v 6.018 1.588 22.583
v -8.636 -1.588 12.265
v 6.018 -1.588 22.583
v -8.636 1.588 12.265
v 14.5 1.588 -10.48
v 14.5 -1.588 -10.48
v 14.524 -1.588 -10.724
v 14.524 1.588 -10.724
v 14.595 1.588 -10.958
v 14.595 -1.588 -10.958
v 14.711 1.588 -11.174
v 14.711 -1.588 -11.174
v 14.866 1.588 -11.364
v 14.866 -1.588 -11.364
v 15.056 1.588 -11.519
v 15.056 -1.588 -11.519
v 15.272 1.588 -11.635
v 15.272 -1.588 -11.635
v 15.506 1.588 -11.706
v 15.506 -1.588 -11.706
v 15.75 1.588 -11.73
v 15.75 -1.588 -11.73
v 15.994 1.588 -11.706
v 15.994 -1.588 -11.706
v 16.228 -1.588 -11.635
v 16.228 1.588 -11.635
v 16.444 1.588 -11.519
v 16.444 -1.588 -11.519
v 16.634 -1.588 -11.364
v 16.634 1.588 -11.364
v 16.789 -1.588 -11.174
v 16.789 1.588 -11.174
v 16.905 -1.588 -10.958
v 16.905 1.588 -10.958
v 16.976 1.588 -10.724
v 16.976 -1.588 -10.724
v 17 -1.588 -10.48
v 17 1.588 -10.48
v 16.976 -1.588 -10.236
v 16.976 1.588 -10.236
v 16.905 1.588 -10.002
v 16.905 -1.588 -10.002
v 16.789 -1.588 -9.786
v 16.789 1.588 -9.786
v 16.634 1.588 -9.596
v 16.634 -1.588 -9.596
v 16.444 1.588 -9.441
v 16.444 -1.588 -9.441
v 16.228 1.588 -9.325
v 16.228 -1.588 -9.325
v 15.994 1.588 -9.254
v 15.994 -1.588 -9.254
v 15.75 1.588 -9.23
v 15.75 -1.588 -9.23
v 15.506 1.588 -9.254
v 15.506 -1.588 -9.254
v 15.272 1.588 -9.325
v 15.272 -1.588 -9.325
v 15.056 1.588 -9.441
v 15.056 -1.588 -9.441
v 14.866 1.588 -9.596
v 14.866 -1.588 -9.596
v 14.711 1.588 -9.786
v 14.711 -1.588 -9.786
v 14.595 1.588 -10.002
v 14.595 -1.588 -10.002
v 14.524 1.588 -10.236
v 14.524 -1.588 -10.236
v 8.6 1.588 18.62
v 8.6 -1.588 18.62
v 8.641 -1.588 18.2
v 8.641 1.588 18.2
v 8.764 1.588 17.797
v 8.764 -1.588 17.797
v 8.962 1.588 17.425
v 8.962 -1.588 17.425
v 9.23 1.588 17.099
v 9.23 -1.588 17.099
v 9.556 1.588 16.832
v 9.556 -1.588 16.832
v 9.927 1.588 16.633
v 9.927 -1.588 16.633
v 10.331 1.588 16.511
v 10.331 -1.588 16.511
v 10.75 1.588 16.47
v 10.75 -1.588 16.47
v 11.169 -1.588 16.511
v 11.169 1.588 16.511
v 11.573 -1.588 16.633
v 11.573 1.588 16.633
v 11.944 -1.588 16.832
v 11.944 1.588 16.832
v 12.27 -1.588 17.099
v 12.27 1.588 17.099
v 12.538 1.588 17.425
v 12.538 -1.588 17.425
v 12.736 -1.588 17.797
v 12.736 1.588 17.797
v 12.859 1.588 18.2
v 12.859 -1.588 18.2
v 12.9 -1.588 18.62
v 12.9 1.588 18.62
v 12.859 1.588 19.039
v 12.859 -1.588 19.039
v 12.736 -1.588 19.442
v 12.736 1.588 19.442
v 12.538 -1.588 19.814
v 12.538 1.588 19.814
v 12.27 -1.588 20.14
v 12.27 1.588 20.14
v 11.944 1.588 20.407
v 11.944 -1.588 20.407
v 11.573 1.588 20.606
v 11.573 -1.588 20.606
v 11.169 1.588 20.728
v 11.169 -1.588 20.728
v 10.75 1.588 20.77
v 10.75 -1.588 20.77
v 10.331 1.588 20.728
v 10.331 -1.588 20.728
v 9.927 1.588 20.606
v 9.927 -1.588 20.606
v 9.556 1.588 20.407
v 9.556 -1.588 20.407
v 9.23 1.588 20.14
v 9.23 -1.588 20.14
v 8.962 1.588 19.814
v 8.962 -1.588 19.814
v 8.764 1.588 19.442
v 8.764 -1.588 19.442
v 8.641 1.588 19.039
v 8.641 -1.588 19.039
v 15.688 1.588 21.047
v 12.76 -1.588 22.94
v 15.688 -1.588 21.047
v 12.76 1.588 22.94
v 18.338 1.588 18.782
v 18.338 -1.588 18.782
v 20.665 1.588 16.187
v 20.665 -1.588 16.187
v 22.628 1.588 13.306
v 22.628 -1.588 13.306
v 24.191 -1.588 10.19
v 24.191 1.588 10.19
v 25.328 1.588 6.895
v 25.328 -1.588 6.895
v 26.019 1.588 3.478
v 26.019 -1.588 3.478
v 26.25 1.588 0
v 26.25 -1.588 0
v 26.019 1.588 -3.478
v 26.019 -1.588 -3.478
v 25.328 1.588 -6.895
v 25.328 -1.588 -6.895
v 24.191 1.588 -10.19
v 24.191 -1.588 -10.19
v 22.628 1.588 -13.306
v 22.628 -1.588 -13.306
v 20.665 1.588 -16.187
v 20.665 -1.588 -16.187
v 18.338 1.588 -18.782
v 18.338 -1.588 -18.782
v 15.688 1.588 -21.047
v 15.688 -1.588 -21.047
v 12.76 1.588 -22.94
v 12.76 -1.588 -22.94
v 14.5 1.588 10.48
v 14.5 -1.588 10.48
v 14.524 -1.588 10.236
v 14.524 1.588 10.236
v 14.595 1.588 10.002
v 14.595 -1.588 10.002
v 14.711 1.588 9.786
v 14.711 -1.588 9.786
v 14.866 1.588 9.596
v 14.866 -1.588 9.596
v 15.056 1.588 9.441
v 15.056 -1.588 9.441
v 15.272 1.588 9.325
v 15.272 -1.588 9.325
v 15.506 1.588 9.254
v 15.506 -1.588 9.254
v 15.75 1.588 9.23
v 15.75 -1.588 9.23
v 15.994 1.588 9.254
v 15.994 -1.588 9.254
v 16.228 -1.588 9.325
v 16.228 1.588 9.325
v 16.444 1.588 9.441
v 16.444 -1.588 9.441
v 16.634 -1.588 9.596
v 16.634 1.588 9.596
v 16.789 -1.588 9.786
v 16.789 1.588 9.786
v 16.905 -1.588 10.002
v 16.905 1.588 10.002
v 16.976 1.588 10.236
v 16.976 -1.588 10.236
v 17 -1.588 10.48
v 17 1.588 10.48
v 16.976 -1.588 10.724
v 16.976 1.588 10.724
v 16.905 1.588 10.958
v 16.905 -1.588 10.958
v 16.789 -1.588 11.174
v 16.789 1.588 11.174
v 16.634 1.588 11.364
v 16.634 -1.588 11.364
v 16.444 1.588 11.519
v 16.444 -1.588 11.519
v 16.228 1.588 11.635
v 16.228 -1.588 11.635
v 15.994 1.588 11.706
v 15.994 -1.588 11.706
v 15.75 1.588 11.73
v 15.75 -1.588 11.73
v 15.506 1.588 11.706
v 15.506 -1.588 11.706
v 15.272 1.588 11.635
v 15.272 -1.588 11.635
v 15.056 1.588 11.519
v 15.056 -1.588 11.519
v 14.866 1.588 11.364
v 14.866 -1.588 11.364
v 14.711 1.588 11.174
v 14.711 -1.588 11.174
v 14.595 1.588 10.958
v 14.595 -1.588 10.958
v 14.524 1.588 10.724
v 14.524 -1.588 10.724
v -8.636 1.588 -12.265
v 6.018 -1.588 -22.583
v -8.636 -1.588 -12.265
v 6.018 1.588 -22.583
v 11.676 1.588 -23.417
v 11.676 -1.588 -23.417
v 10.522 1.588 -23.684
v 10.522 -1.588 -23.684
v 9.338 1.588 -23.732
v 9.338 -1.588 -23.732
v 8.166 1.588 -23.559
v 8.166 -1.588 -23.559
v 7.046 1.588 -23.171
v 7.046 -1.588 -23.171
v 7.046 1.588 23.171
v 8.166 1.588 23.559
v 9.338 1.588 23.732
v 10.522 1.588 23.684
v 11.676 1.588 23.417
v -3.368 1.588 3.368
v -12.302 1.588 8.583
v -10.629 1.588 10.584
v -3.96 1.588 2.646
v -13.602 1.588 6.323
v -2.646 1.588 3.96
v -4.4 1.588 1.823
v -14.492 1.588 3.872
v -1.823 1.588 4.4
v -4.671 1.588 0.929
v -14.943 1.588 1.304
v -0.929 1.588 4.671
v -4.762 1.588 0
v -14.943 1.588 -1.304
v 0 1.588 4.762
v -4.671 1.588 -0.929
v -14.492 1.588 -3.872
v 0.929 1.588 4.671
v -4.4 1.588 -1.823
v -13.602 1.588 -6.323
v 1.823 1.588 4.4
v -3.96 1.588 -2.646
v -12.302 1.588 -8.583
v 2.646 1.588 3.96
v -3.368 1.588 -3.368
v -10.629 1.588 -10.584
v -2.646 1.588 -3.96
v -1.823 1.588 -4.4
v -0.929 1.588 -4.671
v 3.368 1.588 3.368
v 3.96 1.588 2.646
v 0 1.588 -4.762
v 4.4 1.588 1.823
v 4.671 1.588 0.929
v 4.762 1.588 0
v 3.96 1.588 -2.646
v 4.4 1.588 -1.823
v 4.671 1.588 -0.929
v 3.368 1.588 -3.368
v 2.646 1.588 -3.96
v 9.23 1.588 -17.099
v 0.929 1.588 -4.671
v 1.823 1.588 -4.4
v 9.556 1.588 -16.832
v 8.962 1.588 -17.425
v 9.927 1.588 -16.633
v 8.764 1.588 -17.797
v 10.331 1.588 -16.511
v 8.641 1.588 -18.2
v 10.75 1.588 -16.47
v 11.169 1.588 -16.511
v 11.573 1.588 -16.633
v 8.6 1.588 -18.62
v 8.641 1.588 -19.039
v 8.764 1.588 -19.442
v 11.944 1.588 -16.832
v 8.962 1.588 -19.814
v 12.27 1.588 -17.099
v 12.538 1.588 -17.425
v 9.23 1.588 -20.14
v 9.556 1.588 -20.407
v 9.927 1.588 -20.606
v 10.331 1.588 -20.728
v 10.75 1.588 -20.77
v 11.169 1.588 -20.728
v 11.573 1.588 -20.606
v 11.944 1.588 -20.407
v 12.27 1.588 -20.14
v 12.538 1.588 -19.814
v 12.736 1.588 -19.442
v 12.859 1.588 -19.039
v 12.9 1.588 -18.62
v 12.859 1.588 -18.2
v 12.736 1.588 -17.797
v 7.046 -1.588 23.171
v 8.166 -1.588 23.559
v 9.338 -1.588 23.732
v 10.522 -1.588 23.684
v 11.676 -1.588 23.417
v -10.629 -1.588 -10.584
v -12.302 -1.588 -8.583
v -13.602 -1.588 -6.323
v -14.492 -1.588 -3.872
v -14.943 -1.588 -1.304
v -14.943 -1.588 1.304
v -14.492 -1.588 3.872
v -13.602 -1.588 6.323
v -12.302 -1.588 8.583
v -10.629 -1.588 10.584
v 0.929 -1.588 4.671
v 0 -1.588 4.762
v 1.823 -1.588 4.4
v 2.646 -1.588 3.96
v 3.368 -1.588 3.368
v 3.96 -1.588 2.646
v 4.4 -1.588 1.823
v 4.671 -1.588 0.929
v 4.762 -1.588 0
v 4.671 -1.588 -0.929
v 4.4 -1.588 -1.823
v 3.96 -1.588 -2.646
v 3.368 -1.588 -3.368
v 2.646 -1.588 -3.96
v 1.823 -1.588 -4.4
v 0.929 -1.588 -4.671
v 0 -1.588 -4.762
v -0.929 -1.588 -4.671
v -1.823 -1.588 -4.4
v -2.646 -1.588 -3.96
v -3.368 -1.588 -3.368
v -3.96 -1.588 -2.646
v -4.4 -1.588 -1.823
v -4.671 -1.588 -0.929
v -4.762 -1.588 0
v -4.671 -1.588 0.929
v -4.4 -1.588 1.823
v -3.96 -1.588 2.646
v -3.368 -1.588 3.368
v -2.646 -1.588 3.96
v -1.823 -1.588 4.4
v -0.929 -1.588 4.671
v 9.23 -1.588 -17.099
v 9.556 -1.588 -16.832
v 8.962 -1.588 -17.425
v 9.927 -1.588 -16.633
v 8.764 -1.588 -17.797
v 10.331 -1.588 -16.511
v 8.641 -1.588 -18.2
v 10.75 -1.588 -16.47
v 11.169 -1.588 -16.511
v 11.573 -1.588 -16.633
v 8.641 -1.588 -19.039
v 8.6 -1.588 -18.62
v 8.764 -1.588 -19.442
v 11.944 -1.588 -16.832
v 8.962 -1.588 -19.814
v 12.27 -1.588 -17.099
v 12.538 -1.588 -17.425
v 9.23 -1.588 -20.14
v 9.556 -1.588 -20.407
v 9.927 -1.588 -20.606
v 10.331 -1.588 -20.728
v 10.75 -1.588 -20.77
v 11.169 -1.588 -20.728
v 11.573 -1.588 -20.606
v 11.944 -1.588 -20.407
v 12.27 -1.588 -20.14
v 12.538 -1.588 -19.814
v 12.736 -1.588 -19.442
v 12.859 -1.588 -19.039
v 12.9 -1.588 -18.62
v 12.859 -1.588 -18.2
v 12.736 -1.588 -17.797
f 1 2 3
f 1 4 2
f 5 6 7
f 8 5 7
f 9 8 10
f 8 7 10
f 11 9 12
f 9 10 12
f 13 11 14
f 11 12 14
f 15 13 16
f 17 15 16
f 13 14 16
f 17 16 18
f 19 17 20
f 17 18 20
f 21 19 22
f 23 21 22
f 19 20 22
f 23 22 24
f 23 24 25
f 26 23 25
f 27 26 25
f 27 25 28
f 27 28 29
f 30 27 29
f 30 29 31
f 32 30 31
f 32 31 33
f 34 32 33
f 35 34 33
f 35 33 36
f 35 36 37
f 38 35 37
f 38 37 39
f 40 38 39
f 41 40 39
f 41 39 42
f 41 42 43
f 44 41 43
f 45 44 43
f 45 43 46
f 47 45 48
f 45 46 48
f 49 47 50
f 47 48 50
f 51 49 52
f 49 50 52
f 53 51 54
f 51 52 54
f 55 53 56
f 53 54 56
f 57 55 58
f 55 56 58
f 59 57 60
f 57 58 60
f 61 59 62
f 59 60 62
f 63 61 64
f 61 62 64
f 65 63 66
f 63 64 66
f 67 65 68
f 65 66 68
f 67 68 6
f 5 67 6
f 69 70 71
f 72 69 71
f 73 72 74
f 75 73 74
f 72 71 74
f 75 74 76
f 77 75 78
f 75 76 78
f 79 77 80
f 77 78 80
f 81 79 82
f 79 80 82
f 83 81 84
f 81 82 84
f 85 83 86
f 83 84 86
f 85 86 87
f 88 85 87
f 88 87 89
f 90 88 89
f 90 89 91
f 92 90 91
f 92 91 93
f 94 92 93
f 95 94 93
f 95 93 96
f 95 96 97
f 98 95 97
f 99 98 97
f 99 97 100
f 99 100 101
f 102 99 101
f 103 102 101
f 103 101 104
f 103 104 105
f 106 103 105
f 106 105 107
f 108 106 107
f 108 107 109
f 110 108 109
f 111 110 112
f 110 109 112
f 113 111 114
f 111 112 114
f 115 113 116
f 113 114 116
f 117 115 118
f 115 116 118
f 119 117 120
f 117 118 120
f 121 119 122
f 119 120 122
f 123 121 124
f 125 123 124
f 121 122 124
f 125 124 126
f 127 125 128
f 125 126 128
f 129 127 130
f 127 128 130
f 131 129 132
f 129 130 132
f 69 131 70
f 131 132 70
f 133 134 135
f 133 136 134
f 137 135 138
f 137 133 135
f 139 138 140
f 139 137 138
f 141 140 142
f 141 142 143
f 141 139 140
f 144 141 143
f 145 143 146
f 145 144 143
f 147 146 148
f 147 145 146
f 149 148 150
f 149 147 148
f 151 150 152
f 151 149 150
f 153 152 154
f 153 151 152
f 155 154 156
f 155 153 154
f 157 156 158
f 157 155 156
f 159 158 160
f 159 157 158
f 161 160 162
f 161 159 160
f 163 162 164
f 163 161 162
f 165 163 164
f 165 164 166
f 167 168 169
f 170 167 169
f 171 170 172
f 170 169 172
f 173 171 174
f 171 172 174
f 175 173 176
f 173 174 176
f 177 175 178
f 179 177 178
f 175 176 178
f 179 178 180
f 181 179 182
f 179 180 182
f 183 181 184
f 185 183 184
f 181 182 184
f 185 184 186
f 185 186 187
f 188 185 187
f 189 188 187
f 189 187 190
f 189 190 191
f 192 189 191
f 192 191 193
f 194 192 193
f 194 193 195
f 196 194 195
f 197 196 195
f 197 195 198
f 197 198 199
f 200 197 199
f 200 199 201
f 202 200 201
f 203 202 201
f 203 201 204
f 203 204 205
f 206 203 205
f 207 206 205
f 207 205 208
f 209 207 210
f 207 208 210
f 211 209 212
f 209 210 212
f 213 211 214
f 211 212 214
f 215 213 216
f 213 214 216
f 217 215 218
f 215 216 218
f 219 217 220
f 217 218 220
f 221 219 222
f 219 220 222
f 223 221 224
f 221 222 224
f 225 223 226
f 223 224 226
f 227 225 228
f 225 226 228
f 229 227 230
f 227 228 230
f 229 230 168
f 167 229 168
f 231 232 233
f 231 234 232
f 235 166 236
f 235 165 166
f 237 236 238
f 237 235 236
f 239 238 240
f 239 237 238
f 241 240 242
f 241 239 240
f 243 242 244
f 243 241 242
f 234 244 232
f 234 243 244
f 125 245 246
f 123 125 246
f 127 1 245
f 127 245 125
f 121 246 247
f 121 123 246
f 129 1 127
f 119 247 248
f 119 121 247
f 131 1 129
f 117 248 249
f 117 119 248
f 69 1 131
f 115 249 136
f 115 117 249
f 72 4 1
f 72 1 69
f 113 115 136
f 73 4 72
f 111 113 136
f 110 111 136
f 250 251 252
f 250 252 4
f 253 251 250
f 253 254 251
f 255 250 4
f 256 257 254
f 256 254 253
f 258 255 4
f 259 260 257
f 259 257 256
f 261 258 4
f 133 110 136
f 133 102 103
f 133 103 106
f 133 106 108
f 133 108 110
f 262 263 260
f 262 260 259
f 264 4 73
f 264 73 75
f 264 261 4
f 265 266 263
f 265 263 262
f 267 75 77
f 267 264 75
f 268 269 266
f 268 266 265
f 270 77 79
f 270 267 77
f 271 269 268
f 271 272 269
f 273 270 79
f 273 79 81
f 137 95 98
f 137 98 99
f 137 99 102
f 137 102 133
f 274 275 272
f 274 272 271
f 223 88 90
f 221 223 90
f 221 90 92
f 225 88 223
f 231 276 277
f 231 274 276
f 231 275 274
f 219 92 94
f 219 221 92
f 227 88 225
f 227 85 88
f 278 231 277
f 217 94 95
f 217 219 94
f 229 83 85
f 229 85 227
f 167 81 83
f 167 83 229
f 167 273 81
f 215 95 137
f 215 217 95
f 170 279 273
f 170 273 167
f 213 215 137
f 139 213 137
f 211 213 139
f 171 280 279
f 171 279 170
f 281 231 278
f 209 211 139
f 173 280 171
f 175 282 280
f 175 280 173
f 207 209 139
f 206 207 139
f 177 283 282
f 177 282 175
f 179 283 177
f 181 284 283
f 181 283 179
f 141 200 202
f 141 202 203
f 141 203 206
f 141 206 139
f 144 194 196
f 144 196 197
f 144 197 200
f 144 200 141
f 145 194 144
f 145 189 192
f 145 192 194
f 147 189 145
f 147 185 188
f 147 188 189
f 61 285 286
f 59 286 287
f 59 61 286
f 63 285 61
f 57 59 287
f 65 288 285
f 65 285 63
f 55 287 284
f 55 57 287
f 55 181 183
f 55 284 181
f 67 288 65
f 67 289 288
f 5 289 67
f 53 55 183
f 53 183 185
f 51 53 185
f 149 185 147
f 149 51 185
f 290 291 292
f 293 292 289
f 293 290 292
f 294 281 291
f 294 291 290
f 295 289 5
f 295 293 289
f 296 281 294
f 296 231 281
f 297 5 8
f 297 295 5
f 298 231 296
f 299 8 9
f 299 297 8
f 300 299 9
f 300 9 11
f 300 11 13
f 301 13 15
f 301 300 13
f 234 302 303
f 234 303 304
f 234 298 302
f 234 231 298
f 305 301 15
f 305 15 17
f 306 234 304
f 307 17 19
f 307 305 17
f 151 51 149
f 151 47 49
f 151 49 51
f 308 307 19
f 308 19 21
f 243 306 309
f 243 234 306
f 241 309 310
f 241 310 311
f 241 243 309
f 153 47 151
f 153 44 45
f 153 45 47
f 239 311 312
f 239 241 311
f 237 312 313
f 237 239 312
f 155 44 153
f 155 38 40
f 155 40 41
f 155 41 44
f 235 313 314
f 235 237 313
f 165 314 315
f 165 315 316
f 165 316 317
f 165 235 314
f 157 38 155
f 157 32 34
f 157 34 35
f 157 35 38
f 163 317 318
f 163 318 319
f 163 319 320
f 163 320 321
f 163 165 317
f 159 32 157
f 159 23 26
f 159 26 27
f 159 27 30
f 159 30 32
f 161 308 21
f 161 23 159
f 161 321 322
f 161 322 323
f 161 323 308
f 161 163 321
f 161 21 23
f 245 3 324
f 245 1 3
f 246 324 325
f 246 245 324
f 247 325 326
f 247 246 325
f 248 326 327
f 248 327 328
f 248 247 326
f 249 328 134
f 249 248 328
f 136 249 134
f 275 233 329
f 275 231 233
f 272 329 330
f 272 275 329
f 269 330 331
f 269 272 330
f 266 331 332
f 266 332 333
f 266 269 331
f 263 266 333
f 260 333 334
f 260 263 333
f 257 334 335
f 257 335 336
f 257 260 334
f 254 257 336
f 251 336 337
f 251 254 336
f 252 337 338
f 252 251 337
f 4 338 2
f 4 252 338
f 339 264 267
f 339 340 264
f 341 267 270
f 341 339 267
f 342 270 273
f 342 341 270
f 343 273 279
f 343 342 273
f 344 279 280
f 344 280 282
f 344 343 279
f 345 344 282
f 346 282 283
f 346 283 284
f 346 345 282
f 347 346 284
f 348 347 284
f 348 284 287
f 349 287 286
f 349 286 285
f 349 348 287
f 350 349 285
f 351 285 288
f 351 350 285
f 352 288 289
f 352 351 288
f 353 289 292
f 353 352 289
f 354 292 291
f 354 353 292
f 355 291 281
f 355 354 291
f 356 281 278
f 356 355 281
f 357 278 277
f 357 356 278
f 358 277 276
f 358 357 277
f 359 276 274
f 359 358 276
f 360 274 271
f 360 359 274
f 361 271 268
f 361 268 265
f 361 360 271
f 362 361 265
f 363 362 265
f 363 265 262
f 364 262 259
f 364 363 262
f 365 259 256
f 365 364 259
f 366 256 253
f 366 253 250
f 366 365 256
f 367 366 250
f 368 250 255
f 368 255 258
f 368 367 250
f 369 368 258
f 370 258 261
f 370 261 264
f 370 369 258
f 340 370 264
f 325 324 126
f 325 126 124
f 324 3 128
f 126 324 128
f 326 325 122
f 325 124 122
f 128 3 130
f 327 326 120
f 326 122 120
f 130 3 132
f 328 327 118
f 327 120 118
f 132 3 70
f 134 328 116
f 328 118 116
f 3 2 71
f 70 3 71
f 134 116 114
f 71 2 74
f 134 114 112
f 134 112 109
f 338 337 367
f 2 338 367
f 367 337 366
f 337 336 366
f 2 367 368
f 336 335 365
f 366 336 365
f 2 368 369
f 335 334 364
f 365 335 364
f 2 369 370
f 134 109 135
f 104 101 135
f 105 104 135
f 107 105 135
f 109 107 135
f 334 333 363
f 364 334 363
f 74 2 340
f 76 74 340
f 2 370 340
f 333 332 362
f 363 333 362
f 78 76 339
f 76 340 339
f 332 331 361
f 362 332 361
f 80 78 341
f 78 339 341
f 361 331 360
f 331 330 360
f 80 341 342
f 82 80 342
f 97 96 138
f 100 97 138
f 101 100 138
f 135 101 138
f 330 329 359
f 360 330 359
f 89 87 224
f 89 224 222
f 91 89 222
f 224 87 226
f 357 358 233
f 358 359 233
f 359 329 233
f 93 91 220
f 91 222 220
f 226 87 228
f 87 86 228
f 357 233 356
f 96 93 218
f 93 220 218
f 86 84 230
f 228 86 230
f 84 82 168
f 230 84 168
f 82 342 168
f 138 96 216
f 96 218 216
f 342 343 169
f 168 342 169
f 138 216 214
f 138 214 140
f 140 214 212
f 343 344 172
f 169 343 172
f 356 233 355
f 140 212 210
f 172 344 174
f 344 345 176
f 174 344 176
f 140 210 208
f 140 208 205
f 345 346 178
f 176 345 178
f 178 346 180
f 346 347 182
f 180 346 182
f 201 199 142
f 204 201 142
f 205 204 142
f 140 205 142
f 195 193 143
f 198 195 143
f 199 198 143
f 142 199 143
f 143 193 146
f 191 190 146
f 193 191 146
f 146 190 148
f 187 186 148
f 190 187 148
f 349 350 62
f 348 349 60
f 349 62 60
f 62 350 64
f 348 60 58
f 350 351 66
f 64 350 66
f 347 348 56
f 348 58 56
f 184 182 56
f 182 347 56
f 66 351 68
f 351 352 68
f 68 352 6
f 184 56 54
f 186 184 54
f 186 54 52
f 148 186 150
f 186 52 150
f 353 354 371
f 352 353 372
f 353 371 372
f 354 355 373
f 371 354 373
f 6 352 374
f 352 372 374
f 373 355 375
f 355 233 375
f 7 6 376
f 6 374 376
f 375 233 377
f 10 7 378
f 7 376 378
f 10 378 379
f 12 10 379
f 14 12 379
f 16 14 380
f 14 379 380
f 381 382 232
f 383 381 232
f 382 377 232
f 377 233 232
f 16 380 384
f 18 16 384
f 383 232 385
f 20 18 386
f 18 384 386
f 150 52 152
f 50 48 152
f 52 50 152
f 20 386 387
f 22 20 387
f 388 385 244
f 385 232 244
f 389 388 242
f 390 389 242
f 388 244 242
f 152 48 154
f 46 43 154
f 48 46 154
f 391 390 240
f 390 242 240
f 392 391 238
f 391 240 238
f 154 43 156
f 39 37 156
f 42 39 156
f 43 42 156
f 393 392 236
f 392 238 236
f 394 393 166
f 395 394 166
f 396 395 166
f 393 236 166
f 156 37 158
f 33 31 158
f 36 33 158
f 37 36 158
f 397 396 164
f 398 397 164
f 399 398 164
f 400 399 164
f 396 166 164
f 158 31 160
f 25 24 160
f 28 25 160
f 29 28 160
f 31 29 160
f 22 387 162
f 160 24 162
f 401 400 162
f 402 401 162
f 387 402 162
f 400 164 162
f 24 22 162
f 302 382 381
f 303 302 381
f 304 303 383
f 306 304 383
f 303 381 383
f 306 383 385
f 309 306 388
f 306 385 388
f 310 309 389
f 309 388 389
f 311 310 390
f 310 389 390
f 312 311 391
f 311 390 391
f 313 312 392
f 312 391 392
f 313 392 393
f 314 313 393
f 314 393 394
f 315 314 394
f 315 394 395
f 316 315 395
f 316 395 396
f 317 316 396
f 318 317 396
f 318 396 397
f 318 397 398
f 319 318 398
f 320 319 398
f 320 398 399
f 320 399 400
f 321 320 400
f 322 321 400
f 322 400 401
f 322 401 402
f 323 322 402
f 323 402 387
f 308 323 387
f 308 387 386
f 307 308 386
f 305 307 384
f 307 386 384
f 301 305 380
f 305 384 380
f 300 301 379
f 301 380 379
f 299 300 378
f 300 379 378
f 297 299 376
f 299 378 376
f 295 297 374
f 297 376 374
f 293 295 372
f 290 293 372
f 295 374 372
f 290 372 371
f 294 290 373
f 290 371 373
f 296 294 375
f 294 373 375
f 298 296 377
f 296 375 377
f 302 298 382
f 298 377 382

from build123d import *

# Parameters (mm, degrees)
SKETCH1_R                 = 4.7625
BOSS_EXTRUDE1_DEPTH       = 1.5875
M4_CLEARANCE_HOLE1_D      = 4.3
M3X0_5_TAPPED_HOLE1_D     = 2.5
M3X0_5_TAPPED_HOLE1_DEPTH = 3.175
FILLET1_R                 = 6.35


with BuildPart() as part:
    # Sketch1 → Boss-Extrude1 (new, symmetric)
    with BuildSketch(Plane(origin=(0, 0, 0), x_dir=(1, 0, 0), z_dir=(0, 1, 0))):
        with BuildLine():
            Line((-8.635805476, -12.264699906), (8.978028762, -24.666931296))
            ThreePointArc((8.978028762, -24.666931296), (26.25, 0), (8.978028762, 24.666931296))
            Line((8.978028762, 24.666931296), (-8.635805476, 12.264699906))
            ThreePointArc((-8.635805476, 12.264699906), (-15, 0), (-8.635805476, -12.264699906))
        make_face()
        with Locations(Location((0, 0, 0), (0, 0, 270))):
            Circle(SKETCH1_R, mode=Mode.SUBTRACT)
    extrude(amount=BOSS_EXTRUDE1_DEPTH, both=True)

    # M4 Clearance Hole1 (through all)
    with Locations(Plane(origin=(0, 1.5875, 0), x_dir=(1, 0, 0), z_dir=(0, 1, 0))):
        with Locations((10.75, -18.619546181), (10.75, 18.619546181)):
            Hole(M4_CLEARANCE_HOLE1_D / 2)

    # M3x0.5 Tapped Hole1
    with Locations(Plane(origin=(0, 1.5875, 0), x_dir=(1, 0, 0), z_dir=(0, 1, 0))):
        with Locations((0, 0), (15.75, -10.48), (15.75, 10.48)):
            Hole(M3X0_5_TAPPED_HOLE1_D / 2, depth=M3X0_5_TAPPED_HOLE1_DEPTH)

    # Fillet1
    fillet1_edges = [part.edges().sort_by_distance(p)[0] for p in [
        (8.978028762, 0, -24.666931296),
        (8.978028762, 0, 24.666931296),
    ]]
    fillet(fillet1_edges, radius=FILLET1_R)


solid = part.part
